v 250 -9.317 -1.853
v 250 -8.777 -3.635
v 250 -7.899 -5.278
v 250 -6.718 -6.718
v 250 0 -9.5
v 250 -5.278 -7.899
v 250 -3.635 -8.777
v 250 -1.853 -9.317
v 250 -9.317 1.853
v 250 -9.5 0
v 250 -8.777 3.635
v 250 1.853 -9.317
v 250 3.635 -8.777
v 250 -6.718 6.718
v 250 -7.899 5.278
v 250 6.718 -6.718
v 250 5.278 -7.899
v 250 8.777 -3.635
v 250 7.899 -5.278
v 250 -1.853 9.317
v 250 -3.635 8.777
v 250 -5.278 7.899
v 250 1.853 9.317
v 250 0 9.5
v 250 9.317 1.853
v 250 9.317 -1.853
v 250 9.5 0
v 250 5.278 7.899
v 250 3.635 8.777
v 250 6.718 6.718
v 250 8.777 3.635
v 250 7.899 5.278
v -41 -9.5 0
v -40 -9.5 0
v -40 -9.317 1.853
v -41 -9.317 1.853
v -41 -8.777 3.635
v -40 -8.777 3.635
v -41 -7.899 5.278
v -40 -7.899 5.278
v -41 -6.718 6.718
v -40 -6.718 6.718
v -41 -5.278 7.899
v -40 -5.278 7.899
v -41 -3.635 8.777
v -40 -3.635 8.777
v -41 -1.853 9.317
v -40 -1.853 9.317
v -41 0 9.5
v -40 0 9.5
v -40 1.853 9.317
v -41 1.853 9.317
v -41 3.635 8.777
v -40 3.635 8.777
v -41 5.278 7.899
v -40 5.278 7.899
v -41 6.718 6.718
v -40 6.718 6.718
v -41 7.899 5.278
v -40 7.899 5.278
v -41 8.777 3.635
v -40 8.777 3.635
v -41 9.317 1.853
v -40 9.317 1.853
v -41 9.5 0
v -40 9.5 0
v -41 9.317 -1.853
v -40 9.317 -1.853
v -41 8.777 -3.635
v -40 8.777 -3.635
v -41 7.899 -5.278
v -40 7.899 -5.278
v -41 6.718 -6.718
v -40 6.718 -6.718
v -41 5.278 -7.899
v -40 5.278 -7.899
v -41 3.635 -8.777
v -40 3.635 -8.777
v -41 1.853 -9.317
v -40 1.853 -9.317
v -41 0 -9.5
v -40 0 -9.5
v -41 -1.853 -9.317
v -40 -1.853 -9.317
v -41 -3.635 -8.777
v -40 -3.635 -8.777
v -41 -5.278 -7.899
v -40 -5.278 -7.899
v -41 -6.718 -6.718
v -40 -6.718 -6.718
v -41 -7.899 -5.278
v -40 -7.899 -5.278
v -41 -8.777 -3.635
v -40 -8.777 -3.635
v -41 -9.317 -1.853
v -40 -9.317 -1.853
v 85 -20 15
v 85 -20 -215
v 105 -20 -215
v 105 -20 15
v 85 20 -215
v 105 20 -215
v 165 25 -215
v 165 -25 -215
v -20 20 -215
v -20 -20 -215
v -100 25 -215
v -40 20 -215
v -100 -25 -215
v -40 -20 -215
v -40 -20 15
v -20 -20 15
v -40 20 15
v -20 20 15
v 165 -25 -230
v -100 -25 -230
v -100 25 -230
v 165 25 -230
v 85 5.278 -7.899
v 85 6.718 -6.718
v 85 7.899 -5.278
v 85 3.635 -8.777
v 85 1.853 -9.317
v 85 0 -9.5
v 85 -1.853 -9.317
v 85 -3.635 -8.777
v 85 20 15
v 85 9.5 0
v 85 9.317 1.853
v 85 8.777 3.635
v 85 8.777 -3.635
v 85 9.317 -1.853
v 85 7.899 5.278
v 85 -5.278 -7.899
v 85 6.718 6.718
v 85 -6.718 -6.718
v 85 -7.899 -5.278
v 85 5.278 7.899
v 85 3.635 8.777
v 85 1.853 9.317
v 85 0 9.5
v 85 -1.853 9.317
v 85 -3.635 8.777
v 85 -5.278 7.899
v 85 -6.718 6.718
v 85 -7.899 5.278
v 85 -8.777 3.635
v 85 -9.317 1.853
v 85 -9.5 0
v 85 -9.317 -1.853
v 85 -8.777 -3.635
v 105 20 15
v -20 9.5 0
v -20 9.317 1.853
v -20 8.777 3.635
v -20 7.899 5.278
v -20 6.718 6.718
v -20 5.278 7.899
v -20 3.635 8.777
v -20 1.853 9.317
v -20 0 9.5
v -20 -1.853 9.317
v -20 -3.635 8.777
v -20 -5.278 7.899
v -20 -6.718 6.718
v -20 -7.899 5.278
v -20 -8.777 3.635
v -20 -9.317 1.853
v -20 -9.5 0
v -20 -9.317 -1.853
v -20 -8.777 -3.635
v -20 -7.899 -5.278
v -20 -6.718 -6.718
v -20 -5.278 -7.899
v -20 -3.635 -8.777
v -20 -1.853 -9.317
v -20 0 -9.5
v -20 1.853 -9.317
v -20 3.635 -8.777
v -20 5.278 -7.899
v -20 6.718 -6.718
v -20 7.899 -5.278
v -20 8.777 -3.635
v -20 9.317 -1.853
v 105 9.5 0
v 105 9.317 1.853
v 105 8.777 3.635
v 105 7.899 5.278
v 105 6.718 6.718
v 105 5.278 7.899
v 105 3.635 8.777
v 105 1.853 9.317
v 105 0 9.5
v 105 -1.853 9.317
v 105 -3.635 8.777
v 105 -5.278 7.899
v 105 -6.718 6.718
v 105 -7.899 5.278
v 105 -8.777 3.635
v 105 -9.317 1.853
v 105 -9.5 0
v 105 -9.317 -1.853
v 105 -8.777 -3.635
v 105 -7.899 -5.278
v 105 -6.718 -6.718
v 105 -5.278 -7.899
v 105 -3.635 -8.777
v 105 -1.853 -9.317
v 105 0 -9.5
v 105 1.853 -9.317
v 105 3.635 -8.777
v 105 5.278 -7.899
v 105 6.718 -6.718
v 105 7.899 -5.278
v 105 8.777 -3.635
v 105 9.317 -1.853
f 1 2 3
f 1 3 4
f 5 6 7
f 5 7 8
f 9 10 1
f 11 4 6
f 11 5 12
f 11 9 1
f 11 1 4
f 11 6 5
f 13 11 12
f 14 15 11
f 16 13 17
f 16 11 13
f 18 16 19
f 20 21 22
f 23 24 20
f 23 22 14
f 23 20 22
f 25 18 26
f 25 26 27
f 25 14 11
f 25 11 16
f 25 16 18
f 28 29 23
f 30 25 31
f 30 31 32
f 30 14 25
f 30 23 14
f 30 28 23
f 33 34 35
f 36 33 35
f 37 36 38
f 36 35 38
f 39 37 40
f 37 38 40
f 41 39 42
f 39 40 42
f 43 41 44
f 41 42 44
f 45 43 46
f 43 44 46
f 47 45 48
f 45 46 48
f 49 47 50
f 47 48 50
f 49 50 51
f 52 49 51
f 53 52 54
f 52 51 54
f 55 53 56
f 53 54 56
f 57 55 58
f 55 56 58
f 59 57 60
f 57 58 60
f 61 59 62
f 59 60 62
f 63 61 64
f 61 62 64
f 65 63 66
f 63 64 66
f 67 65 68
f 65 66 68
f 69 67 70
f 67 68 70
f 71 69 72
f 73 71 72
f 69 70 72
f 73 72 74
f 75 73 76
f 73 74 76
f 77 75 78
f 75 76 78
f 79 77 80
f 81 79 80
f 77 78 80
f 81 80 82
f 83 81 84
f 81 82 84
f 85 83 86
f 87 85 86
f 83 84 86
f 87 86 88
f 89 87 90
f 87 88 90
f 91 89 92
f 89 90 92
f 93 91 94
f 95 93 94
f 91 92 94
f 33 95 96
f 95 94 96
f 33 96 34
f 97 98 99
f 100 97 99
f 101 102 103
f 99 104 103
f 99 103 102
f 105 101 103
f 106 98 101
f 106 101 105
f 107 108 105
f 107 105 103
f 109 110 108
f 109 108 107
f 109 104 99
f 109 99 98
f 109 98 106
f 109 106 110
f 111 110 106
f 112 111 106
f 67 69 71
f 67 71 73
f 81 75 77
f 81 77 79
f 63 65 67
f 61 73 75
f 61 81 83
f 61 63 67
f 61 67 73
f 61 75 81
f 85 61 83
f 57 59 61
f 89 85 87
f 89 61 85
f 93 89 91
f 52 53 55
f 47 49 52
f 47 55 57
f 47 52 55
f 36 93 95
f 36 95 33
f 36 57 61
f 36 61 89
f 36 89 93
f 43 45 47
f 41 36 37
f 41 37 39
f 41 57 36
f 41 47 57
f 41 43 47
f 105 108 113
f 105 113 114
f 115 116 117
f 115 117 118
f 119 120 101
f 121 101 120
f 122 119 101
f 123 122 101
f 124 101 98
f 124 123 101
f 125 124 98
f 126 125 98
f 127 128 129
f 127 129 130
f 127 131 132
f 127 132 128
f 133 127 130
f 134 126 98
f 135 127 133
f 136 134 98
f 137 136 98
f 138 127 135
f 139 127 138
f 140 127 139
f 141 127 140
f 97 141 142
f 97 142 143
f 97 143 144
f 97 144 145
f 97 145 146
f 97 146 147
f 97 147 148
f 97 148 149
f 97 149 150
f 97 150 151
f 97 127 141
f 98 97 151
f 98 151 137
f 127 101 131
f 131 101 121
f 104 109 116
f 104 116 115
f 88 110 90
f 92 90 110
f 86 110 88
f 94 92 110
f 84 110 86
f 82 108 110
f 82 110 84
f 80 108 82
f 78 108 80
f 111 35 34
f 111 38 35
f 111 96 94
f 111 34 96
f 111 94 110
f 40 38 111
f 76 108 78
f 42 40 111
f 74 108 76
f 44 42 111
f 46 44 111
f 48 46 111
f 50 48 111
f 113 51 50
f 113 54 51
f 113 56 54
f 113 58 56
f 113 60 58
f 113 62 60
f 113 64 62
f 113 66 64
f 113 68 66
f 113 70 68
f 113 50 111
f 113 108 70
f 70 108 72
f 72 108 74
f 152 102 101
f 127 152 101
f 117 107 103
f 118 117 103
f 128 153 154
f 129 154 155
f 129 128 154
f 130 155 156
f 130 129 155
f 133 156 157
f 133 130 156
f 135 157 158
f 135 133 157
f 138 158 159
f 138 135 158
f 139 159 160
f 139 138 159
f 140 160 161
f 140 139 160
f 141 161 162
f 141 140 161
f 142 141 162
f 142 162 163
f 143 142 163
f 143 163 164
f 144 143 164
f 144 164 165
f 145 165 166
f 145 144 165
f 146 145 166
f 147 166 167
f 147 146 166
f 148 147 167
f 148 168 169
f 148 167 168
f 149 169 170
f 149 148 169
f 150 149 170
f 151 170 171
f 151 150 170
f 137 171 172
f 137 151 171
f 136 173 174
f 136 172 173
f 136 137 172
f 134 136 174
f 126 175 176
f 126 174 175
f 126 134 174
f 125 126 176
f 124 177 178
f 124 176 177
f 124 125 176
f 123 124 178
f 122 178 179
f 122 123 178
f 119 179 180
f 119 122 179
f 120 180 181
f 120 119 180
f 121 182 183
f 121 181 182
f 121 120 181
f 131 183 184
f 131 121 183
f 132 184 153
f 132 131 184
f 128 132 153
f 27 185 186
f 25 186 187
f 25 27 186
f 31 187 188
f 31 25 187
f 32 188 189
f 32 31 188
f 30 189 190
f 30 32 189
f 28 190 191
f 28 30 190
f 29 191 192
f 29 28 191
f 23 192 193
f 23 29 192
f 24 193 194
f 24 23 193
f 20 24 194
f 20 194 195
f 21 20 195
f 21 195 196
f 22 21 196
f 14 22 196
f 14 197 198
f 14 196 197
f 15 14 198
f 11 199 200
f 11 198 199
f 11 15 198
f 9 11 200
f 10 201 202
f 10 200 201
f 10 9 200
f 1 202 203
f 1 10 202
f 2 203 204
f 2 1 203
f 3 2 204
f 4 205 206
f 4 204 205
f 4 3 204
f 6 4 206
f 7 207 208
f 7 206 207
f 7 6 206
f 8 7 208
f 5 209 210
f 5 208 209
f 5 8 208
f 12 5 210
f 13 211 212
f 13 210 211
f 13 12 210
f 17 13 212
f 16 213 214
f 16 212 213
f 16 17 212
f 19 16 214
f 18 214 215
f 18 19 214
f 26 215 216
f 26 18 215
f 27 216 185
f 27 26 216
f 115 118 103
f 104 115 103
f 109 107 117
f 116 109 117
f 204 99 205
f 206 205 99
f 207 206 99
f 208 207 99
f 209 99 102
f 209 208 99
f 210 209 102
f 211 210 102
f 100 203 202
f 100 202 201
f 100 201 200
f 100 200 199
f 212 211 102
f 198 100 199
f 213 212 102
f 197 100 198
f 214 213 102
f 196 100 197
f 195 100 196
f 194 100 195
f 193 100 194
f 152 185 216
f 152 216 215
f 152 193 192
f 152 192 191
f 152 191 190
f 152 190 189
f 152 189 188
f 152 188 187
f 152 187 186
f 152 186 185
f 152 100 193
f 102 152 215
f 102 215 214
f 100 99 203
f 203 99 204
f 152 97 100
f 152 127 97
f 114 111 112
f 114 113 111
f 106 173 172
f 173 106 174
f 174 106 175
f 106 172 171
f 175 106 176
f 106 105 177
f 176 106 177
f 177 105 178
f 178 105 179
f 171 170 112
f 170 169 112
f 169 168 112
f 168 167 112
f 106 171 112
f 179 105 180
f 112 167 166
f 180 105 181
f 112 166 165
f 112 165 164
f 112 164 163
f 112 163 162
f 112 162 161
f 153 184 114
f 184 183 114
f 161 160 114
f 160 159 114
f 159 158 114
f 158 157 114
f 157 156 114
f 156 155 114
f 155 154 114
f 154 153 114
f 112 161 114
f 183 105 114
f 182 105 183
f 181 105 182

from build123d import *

# Parameters (mm, degrees)
F0_R      = 9.5
F1_DEPTH  = 40
F2_R      = 9.5
F3_DEPTH  = 70
F4_R      = 9.5
F5_DEPTH  = 180
F6_W      = 20
F6_H      = 20
F7_DEPTH  = 15
F8_W      = 20
F8_H      = 10
F9_DEPTH  = 215
F11_DEPTH = 15
F12_DEPTH = 15
F13_DEPTH = 215
F15_DEPTH = 215
F16_W     = 20
F16_H     = 7.5
F17_DEPTH = 20
F18_DEPTH = 25
F19_DEPTH = 25
F20_R     = 9.5
F21_DEPTH = 1


with BuildPart() as f1:
    # F0 (on Right) → F1 (new body)
    with BuildSketch(Plane.YZ):
        Circle(F0_R)
    extrude(amount=-F1_DEPTH)

    # F2 (on face) → F3 (join)
    with BuildSketch(Plane.YZ):
        Circle(F2_R)
    extrude(amount=F3_DEPTH)

    # F4 (on face) → F5 (join)
    with BuildSketch(Plane.YZ.offset(70)):
        Circle(F4_R)
    extrude(amount=F5_DEPTH)

    # F6 (on Top) → F7 (join)
    with BuildSketch(Plane.XY):
        with Locations((-30, -10)):
            Rectangle(F6_W, F6_H)
        with Locations((-30, 10)):
            Rectangle(F6_W, F6_H)
    extrude(amount=F7_DEPTH)

    # F8 (on Top) → F9 (join)
    with BuildSketch(Plane.XY):
        with Locations((-30, -5)):
            Rectangle(F8_W, F8_H)
        with Locations((-30, 5)):
            Rectangle(F8_W, F8_H)
        with Locations((-30, -15)):
            Rectangle(F8_W, F8_H)
        with Locations((-30, 15)):
            Rectangle(F8_W, F8_H)
    extrude(amount=-F9_DEPTH)

    # F10 (on Top) → F11 (join)
    with BuildSketch(Plane.XY):
        Polygon((85, 10), (85, 0), (85, -10), (85, -20), (105, -20), (105, 20), (85, 20), align=None)
    extrude(amount=F11_DEPTH)

    # F6 (on Top) → F12 (join)
    with BuildSketch(Plane.XY):
        with Locations((-30, -10)):
            Rectangle(F6_W, F6_H)
        with Locations((-30, 10)):
            Rectangle(F6_W, F6_H)
    extrude(amount=F12_DEPTH)

    # F8 (on Top) → F13 (join)
    with BuildSketch(Plane.XY):
        with Locations((-30, -5)):
            Rectangle(F8_W, F8_H)
        with Locations((-30, 5)):
            Rectangle(F8_W, F8_H)
        with Locations((-30, -15)):
            Rectangle(F8_W, F8_H)
        with Locations((-30, 15)):
            Rectangle(F8_W, F8_H)
    extrude(amount=-F13_DEPTH)

    # F14 (on Top) → F15 (join)
    with BuildSketch(Plane.XY):
        Polygon((85, 20), (85, 0), (85, -20), (105, -20), (105, 20), align=None)
    extrude(amount=-F15_DEPTH)

    # F16 (on Front) → F17 (join)
    with BuildSketch(Plane.XZ):
        with Locations((-30, -218.75)):
            Rectangle(F16_W, F16_H)
    extrude(amount=F17_DEPTH)

    # F16 (on Front) → F18 (join)
    with BuildSketch(Plane.XZ):
        Polygon((85, -215), (0, -215), (-20, -215), (-20, -222.5), (85, -222.5), align=None)
        with Locations((-30, -218.75)):
            Rectangle(F16_W, F16_H)
        with Locations((95, -218.75)):
            Rectangle(F16_W, F16_H)
        Polygon((-40, -222.5), (-40, -215), (-100, -215), (-100, -230), (-40, -230), align=None)
        Polygon((85, -222.5), (-20, -222.5), (-40, -222.5), (-40, -230), (165, -230), (165, -215), (105, -215), (105, -222.5), align=None)
    extrude(amount=F18_DEPTH)

    # F16 (on Front) → F19 (join)
    with BuildSketch(Plane.XZ):
        Polygon((85, -215), (0, -215), (-20, -215), (-20, -222.5), (85, -222.5), align=None)
        with Locations((-30, -218.75)):
            Rectangle(F16_W, F16_H)
        with Locations((95, -218.75)):
            Rectangle(F16_W, F16_H)
        Polygon((-40, -222.5), (-40, -215), (-100, -215), (-100, -230), (-40, -230), align=None)
        Polygon((85, -222.5), (-20, -222.5), (-40, -222.5), (-40, -230), (165, -230), (165, -215), (105, -215), (105, -222.5), align=None)
    extrude(amount=-F19_DEPTH)

    # F20 (on face) → F21 (join)
    with BuildSketch(Plane(origin=(-40, 0, 0), x_dir=(0, -1, 0), z_dir=(-1, 0, 0))):
        Circle(F20_R)
    extrude(amount=F21_DEPTH)


solid = f1.part
